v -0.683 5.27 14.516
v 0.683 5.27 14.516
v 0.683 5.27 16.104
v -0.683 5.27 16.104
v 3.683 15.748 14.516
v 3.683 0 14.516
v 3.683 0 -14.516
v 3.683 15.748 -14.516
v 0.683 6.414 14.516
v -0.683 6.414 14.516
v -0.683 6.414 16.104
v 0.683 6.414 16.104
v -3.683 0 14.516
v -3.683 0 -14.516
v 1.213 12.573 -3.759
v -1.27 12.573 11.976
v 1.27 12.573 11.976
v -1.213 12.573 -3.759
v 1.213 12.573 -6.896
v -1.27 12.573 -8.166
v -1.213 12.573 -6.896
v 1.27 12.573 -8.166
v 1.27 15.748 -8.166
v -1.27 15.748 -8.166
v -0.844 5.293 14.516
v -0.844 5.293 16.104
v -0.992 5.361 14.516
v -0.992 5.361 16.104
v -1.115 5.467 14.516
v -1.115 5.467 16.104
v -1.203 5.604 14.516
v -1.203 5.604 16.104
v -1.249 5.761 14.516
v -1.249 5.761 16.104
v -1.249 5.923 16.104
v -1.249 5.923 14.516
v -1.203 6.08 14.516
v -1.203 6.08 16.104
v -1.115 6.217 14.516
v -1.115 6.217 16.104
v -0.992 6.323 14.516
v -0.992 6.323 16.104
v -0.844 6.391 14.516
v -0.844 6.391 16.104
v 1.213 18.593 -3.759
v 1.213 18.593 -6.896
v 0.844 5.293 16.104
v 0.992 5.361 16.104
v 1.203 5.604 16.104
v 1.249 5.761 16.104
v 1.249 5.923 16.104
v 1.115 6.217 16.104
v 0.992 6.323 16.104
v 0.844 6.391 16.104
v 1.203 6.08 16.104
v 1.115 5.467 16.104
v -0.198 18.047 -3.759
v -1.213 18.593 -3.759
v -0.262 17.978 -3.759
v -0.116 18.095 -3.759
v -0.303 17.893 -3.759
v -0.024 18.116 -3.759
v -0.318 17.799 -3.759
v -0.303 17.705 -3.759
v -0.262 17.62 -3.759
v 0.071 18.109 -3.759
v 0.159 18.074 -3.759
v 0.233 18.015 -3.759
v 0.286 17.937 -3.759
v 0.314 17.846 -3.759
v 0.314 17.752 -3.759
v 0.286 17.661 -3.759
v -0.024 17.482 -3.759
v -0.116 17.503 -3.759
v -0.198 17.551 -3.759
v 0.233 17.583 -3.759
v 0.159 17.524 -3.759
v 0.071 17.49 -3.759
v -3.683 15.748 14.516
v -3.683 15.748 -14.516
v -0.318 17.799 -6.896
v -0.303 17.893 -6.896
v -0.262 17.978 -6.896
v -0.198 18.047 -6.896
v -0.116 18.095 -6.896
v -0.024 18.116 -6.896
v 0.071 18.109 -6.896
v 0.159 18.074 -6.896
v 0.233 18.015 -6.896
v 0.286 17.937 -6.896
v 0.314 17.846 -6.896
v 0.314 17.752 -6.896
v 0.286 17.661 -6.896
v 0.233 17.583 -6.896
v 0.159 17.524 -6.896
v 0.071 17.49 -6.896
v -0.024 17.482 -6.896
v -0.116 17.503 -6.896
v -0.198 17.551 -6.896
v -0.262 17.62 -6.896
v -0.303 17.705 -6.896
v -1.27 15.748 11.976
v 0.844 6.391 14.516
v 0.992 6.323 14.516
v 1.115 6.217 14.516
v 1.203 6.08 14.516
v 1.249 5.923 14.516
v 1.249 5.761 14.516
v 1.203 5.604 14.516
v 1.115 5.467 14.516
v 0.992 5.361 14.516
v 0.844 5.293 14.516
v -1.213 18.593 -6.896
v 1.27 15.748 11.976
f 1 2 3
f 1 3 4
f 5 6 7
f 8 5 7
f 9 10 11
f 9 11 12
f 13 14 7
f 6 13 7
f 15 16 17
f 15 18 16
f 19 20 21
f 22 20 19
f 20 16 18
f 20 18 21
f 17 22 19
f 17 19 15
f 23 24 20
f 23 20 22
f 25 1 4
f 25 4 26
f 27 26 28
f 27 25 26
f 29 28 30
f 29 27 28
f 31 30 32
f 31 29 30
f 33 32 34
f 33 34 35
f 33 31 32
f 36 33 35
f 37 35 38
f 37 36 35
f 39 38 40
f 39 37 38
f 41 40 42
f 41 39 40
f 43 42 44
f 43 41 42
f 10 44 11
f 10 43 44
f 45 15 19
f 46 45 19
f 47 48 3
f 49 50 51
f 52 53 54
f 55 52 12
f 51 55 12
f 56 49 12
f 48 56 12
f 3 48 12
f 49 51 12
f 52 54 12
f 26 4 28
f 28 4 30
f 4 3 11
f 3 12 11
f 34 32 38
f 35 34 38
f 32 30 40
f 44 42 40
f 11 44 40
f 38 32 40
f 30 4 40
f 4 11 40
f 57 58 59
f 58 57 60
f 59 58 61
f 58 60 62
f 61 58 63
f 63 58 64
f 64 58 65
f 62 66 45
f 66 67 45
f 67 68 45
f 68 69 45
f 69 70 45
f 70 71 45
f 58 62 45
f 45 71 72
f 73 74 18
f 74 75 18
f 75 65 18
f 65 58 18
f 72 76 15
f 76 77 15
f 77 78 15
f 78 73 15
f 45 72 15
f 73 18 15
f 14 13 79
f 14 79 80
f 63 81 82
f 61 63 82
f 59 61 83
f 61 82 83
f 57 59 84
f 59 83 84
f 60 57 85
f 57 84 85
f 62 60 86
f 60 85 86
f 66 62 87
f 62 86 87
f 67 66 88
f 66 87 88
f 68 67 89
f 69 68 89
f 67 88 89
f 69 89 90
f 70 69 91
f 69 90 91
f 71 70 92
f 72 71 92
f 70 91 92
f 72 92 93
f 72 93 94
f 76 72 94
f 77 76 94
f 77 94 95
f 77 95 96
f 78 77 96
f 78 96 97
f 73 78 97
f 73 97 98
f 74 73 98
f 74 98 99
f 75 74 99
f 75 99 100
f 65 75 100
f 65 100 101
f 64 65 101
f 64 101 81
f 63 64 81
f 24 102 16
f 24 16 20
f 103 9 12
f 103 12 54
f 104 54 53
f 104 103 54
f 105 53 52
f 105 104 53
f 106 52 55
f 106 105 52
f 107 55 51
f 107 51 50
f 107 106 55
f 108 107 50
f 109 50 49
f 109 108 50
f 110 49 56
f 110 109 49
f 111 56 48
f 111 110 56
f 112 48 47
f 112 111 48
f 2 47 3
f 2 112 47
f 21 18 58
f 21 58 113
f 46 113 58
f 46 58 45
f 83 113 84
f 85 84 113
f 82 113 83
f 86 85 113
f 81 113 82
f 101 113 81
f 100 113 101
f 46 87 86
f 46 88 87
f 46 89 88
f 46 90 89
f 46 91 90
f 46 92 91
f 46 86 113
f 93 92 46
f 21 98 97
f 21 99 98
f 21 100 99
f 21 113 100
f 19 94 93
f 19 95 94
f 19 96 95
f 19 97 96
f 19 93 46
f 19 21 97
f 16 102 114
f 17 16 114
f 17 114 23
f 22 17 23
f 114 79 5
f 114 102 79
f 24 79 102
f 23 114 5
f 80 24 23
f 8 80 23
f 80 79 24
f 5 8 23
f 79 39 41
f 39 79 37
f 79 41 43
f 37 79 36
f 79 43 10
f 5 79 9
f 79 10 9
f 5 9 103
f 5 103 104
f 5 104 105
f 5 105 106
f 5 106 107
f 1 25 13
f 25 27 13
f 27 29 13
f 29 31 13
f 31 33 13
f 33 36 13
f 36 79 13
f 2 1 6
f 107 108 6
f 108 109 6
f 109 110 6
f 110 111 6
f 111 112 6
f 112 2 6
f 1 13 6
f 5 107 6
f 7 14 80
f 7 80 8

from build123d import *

# Parameters (mm, degrees)
SKETCH1_W           = 7.366
SKETCH1_H           = 29.0322
BOSS_EXTRUDE1_DEPTH = 15.748
SKETCH2_W           = 2.54
SKETCH2_H           = 20.1422
CUT_EXTRUDE1_DEPTH  = 3.175
SKETCH3_W           = 2.4257
SKETCH3_H           = 3.1369
BOSS_EXTRUDE2_DEPTH = 6.0198
SKETCH4_R           = 0.3175
CUT_EXTRUDE2_DEPTH  = 29.596136272
BOSS_EXTRUDE3_DEPTH = 1.5875


with BuildPart() as part:
    # Sketch1 → Boss-Extrude1 (new body)
    with BuildSketch(Plane(origin=(0, 0, 0), x_dir=(1, 0, 0), z_dir=(0, 1, 0))):
        Rectangle(SKETCH1_W, SKETCH1_H)
    extrude(amount=BOSS_EXTRUDE1_DEPTH)

    # Sketch2 → Cut-Extrude1 (cut)
    with BuildSketch(Plane(origin=(0, 15.748, 0), x_dir=(1, 0, 0), z_dir=(0, 1, 0))):
        with Locations((0, -1.905)):
            Rectangle(SKETCH2_W, SKETCH2_H)
    extrude(amount=-CUT_EXTRUDE1_DEPTH, mode=Mode.SUBTRACT)

    # Sketch3 → Boss-Extrude2 (add)
    with BuildSketch(Plane(origin=(0, 12.573, 0), x_dir=(1, 0, 0), z_dir=(0, 1, 0))):
        with Locations((0, 5.32765)):
            Rectangle(SKETCH3_W, SKETCH3_H)
    extrude(amount=BOSS_EXTRUDE2_DEPTH)

    # Sketch4 → Cut-Extrude2 (cut, through all)
    with BuildSketch(Plane(origin=(0, 0, -6.8961), x_dir=(-1, 0, 0), z_dir=(0, 0, -1))):
        with Locations((0, 17.79905)):
            Circle(SKETCH4_R)
    extrude(amount=-CUT_EXTRUDE2_DEPTH, mode=Mode.SUBTRACT)

    # Sketch5 → Boss-Extrude3 (add)
    with BuildSketch(Plane.XY.offset(14.5161)):
        with BuildLine():
            Line((-0.682666257, 6.414003725), (0.682666257, 6.414003725))
            ThreePointArc((0.682666257, 6.414003725), (1.254669982, 5.842), (0.682666257, 5.269996275))
            Line((0.682666257, 5.269996275), (-0.682666257, 5.269996275))
            ThreePointArc((-0.682666257, 5.269996275), (-1.254669982, 5.842), (-0.682666257, 6.414003725))
        make_face()
    extrude(amount=BOSS_EXTRUDE3_DEPTH)


solid = part.part
